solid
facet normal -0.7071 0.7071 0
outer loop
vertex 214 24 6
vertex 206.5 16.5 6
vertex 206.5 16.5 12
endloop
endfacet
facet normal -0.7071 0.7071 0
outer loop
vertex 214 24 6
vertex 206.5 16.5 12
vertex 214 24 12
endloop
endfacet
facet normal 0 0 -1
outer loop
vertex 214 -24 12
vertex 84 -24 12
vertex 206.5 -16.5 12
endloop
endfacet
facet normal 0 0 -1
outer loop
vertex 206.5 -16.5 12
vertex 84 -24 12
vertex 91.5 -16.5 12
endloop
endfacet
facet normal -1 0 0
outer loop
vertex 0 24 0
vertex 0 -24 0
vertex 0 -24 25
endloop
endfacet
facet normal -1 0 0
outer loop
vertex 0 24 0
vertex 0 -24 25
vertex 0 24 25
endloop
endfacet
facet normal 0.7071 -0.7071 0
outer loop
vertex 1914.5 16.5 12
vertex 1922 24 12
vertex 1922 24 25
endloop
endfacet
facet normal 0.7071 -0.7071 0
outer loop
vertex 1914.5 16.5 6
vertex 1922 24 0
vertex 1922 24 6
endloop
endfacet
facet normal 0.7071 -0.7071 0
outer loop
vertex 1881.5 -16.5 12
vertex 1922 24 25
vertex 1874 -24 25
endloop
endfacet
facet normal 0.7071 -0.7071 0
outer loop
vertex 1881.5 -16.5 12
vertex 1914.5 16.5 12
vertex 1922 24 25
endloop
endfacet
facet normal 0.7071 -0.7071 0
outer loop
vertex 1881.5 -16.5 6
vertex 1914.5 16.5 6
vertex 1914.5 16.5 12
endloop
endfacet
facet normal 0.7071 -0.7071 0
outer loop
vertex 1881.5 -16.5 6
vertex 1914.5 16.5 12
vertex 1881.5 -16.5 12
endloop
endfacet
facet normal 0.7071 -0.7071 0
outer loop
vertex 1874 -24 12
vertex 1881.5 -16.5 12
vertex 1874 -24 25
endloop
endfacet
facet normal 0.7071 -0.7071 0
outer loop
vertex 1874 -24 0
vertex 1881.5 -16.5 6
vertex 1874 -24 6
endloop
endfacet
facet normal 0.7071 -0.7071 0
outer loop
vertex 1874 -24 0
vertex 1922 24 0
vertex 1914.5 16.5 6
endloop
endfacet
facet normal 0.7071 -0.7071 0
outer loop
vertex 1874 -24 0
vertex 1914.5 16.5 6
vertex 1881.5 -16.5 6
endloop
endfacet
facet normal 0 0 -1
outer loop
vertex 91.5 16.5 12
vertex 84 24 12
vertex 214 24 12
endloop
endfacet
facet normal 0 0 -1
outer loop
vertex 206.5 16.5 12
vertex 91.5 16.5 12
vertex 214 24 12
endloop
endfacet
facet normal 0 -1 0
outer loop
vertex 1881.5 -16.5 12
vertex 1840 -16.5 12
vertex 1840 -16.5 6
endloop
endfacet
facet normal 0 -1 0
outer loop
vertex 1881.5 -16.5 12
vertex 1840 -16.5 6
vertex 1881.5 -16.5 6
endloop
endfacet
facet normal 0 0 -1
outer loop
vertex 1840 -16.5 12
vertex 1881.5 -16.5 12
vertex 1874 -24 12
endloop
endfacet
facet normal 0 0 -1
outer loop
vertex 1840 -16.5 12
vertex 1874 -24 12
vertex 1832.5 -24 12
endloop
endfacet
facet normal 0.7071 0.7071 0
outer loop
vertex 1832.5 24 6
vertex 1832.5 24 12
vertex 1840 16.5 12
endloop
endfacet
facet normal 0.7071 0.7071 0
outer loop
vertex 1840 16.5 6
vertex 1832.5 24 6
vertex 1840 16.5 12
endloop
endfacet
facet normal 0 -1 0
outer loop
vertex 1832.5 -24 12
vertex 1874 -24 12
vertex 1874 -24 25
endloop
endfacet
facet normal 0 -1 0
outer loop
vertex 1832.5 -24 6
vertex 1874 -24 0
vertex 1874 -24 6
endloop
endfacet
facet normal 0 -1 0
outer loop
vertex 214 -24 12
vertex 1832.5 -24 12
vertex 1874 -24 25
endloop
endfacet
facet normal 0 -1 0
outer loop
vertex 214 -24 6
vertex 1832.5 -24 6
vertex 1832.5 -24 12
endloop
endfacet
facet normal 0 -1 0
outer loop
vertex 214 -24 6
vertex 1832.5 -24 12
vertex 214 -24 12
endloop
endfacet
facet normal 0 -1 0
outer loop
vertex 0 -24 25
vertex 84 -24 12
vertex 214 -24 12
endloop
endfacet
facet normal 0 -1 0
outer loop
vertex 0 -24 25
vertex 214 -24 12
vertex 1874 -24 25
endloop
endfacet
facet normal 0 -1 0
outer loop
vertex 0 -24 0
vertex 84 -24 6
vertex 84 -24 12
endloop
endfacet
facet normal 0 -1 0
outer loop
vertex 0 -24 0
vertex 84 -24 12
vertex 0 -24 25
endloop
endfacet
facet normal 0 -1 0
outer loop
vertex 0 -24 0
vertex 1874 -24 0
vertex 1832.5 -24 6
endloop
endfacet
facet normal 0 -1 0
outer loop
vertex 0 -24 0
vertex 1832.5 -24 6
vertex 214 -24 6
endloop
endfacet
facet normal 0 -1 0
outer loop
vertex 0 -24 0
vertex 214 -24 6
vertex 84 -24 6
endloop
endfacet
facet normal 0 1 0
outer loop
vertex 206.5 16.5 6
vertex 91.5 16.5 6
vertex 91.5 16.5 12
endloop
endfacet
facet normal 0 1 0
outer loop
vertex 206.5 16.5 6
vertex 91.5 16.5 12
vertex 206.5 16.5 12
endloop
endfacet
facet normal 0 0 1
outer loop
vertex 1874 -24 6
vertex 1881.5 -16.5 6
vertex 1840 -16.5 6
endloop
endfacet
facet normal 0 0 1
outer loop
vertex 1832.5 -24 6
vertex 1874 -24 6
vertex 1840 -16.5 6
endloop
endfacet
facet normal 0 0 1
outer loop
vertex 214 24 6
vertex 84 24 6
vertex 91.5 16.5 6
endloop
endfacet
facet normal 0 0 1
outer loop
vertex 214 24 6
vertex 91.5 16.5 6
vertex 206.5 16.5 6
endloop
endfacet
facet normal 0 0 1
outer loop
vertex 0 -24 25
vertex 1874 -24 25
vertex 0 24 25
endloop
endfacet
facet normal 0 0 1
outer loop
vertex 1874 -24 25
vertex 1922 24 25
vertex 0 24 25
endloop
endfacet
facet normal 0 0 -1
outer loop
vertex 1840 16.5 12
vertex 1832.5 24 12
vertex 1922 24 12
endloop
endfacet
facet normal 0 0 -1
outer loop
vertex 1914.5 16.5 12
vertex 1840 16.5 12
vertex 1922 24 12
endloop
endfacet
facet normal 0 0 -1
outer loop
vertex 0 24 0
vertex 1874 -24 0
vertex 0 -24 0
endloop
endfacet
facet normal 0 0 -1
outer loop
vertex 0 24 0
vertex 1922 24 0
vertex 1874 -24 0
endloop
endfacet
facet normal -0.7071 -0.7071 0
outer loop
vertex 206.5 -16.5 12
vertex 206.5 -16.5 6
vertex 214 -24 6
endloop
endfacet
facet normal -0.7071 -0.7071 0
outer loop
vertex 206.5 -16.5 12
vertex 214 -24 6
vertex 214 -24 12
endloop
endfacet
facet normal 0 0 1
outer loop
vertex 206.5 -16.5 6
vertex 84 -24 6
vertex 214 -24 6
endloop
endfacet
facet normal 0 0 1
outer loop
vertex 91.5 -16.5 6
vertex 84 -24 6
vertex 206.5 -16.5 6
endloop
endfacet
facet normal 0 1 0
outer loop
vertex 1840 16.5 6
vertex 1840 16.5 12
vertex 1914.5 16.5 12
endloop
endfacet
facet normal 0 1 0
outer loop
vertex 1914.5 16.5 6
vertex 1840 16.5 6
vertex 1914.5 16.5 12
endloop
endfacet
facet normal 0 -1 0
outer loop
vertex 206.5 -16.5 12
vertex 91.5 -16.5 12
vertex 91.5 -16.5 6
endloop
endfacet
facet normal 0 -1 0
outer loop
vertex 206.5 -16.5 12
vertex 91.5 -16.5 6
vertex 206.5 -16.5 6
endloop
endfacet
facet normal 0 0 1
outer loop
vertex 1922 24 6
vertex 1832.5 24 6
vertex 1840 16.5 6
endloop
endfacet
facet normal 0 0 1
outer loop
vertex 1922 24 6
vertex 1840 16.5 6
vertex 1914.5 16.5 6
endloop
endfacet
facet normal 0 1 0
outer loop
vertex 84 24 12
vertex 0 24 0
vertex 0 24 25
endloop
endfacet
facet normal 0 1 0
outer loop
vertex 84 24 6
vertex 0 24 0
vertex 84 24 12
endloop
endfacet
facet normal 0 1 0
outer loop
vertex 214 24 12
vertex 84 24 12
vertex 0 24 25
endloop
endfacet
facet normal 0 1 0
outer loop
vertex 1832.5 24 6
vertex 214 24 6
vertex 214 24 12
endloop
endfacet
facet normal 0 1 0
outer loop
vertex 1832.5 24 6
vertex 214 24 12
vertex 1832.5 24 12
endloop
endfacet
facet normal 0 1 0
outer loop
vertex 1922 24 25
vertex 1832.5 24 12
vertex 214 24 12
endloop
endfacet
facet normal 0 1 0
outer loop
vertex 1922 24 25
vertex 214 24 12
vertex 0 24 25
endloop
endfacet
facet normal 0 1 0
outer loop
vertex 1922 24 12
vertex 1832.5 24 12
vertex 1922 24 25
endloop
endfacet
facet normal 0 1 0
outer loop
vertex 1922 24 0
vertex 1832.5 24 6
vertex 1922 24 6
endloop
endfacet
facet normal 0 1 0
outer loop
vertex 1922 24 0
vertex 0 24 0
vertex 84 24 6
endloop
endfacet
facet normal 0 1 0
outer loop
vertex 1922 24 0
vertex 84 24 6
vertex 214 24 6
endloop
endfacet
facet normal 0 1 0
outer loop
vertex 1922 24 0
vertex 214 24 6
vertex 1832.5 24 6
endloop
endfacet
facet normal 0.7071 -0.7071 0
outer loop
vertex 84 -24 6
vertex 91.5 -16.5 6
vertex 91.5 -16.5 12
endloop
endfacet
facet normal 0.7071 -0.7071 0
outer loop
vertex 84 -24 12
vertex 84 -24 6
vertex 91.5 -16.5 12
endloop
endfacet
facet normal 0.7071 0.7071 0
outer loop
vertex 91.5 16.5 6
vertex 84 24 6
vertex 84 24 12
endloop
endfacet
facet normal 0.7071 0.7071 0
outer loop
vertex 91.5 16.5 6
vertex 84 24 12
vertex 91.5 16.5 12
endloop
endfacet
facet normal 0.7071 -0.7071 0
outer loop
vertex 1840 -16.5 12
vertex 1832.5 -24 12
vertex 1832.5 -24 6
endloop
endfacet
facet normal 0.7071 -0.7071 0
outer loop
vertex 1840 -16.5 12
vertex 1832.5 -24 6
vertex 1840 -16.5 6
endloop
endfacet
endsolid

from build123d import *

# Parameters (mm, degrees)
EXTRUDE_1_DEPTH     = 25
SKETCH_2_W          = 115
SKETCH_2_H          = 6
CUT_EXTRUDE_1_DEPTH = 7.5
DRAFT_1_ANGLE       = 45
MIRROR_START        = 6
MIRROR_1_DEPTH      = 6
CUT_EXTRUDE_START   = -13
CUT_EXTRUDE_2_DEPTH = 6


# Read off the part's stored shape, not the designer's step: 镜向1
with BuildPart() as part:
    # 草图1 → 凸台-拉伸1 (new body)
    with BuildSketch(Plane.XY):
        Polygon((0, 24), (1922, 24), (1874, -24), (0, -24), align=None)
    extrude(amount=EXTRUDE_1_DEPTH)

    # 草图2 → 切除-拉伸1 (cut)
    with BuildSketch(Plane.XZ.offset(24)):
        with Locations((149, 9)):
            Rectangle(SKETCH_2_W, SKETCH_2_H)
    extrude(amount=-CUT_EXTRUDE_1_DEPTH, mode=Mode.SUBTRACT)

    # 拔模1
    draft_1_faces = [part.faces().sort_by_distance(p)[0] for p in [
        (206.5, -20.25, 9),
        (91.5, -20.25, 9),
    ]]
    draft(draft_1_faces, Plane(origin=(0, -16.5, 0), x_dir=(-1, 0, 0), z_dir=(0, -1, 0)), DRAFT_1_ANGLE)

    # 镜向1 outline → 镜向1 (cut)
    with BuildSketch(Plane.XY.offset(MIRROR_START)):
        Polygon((84, 24), (91.5, 16.5), (206.5, 16.5), (214, 24), align=None)
    extrude(amount=MIRROR_1_DEPTH, mode=Mode.SUBTRACT)

    # 草图3 → 切除-拉伸2 (cut)
    with BuildSketch(Plane.XY.offset(25).offset(CUT_EXTRUDE_START)):
        Polygon((1832.5, 24), (1840, 16.5), (1914.5, 16.5), (1922, 24), align=None)
        Polygon((1832.5, -24), (1840, -16.5), (1881.5, -16.5), (1874, -24), align=None)
    extrude(amount=-CUT_EXTRUDE_2_DEPTH, mode=Mode.SUBTRACT)


solid = part.part
